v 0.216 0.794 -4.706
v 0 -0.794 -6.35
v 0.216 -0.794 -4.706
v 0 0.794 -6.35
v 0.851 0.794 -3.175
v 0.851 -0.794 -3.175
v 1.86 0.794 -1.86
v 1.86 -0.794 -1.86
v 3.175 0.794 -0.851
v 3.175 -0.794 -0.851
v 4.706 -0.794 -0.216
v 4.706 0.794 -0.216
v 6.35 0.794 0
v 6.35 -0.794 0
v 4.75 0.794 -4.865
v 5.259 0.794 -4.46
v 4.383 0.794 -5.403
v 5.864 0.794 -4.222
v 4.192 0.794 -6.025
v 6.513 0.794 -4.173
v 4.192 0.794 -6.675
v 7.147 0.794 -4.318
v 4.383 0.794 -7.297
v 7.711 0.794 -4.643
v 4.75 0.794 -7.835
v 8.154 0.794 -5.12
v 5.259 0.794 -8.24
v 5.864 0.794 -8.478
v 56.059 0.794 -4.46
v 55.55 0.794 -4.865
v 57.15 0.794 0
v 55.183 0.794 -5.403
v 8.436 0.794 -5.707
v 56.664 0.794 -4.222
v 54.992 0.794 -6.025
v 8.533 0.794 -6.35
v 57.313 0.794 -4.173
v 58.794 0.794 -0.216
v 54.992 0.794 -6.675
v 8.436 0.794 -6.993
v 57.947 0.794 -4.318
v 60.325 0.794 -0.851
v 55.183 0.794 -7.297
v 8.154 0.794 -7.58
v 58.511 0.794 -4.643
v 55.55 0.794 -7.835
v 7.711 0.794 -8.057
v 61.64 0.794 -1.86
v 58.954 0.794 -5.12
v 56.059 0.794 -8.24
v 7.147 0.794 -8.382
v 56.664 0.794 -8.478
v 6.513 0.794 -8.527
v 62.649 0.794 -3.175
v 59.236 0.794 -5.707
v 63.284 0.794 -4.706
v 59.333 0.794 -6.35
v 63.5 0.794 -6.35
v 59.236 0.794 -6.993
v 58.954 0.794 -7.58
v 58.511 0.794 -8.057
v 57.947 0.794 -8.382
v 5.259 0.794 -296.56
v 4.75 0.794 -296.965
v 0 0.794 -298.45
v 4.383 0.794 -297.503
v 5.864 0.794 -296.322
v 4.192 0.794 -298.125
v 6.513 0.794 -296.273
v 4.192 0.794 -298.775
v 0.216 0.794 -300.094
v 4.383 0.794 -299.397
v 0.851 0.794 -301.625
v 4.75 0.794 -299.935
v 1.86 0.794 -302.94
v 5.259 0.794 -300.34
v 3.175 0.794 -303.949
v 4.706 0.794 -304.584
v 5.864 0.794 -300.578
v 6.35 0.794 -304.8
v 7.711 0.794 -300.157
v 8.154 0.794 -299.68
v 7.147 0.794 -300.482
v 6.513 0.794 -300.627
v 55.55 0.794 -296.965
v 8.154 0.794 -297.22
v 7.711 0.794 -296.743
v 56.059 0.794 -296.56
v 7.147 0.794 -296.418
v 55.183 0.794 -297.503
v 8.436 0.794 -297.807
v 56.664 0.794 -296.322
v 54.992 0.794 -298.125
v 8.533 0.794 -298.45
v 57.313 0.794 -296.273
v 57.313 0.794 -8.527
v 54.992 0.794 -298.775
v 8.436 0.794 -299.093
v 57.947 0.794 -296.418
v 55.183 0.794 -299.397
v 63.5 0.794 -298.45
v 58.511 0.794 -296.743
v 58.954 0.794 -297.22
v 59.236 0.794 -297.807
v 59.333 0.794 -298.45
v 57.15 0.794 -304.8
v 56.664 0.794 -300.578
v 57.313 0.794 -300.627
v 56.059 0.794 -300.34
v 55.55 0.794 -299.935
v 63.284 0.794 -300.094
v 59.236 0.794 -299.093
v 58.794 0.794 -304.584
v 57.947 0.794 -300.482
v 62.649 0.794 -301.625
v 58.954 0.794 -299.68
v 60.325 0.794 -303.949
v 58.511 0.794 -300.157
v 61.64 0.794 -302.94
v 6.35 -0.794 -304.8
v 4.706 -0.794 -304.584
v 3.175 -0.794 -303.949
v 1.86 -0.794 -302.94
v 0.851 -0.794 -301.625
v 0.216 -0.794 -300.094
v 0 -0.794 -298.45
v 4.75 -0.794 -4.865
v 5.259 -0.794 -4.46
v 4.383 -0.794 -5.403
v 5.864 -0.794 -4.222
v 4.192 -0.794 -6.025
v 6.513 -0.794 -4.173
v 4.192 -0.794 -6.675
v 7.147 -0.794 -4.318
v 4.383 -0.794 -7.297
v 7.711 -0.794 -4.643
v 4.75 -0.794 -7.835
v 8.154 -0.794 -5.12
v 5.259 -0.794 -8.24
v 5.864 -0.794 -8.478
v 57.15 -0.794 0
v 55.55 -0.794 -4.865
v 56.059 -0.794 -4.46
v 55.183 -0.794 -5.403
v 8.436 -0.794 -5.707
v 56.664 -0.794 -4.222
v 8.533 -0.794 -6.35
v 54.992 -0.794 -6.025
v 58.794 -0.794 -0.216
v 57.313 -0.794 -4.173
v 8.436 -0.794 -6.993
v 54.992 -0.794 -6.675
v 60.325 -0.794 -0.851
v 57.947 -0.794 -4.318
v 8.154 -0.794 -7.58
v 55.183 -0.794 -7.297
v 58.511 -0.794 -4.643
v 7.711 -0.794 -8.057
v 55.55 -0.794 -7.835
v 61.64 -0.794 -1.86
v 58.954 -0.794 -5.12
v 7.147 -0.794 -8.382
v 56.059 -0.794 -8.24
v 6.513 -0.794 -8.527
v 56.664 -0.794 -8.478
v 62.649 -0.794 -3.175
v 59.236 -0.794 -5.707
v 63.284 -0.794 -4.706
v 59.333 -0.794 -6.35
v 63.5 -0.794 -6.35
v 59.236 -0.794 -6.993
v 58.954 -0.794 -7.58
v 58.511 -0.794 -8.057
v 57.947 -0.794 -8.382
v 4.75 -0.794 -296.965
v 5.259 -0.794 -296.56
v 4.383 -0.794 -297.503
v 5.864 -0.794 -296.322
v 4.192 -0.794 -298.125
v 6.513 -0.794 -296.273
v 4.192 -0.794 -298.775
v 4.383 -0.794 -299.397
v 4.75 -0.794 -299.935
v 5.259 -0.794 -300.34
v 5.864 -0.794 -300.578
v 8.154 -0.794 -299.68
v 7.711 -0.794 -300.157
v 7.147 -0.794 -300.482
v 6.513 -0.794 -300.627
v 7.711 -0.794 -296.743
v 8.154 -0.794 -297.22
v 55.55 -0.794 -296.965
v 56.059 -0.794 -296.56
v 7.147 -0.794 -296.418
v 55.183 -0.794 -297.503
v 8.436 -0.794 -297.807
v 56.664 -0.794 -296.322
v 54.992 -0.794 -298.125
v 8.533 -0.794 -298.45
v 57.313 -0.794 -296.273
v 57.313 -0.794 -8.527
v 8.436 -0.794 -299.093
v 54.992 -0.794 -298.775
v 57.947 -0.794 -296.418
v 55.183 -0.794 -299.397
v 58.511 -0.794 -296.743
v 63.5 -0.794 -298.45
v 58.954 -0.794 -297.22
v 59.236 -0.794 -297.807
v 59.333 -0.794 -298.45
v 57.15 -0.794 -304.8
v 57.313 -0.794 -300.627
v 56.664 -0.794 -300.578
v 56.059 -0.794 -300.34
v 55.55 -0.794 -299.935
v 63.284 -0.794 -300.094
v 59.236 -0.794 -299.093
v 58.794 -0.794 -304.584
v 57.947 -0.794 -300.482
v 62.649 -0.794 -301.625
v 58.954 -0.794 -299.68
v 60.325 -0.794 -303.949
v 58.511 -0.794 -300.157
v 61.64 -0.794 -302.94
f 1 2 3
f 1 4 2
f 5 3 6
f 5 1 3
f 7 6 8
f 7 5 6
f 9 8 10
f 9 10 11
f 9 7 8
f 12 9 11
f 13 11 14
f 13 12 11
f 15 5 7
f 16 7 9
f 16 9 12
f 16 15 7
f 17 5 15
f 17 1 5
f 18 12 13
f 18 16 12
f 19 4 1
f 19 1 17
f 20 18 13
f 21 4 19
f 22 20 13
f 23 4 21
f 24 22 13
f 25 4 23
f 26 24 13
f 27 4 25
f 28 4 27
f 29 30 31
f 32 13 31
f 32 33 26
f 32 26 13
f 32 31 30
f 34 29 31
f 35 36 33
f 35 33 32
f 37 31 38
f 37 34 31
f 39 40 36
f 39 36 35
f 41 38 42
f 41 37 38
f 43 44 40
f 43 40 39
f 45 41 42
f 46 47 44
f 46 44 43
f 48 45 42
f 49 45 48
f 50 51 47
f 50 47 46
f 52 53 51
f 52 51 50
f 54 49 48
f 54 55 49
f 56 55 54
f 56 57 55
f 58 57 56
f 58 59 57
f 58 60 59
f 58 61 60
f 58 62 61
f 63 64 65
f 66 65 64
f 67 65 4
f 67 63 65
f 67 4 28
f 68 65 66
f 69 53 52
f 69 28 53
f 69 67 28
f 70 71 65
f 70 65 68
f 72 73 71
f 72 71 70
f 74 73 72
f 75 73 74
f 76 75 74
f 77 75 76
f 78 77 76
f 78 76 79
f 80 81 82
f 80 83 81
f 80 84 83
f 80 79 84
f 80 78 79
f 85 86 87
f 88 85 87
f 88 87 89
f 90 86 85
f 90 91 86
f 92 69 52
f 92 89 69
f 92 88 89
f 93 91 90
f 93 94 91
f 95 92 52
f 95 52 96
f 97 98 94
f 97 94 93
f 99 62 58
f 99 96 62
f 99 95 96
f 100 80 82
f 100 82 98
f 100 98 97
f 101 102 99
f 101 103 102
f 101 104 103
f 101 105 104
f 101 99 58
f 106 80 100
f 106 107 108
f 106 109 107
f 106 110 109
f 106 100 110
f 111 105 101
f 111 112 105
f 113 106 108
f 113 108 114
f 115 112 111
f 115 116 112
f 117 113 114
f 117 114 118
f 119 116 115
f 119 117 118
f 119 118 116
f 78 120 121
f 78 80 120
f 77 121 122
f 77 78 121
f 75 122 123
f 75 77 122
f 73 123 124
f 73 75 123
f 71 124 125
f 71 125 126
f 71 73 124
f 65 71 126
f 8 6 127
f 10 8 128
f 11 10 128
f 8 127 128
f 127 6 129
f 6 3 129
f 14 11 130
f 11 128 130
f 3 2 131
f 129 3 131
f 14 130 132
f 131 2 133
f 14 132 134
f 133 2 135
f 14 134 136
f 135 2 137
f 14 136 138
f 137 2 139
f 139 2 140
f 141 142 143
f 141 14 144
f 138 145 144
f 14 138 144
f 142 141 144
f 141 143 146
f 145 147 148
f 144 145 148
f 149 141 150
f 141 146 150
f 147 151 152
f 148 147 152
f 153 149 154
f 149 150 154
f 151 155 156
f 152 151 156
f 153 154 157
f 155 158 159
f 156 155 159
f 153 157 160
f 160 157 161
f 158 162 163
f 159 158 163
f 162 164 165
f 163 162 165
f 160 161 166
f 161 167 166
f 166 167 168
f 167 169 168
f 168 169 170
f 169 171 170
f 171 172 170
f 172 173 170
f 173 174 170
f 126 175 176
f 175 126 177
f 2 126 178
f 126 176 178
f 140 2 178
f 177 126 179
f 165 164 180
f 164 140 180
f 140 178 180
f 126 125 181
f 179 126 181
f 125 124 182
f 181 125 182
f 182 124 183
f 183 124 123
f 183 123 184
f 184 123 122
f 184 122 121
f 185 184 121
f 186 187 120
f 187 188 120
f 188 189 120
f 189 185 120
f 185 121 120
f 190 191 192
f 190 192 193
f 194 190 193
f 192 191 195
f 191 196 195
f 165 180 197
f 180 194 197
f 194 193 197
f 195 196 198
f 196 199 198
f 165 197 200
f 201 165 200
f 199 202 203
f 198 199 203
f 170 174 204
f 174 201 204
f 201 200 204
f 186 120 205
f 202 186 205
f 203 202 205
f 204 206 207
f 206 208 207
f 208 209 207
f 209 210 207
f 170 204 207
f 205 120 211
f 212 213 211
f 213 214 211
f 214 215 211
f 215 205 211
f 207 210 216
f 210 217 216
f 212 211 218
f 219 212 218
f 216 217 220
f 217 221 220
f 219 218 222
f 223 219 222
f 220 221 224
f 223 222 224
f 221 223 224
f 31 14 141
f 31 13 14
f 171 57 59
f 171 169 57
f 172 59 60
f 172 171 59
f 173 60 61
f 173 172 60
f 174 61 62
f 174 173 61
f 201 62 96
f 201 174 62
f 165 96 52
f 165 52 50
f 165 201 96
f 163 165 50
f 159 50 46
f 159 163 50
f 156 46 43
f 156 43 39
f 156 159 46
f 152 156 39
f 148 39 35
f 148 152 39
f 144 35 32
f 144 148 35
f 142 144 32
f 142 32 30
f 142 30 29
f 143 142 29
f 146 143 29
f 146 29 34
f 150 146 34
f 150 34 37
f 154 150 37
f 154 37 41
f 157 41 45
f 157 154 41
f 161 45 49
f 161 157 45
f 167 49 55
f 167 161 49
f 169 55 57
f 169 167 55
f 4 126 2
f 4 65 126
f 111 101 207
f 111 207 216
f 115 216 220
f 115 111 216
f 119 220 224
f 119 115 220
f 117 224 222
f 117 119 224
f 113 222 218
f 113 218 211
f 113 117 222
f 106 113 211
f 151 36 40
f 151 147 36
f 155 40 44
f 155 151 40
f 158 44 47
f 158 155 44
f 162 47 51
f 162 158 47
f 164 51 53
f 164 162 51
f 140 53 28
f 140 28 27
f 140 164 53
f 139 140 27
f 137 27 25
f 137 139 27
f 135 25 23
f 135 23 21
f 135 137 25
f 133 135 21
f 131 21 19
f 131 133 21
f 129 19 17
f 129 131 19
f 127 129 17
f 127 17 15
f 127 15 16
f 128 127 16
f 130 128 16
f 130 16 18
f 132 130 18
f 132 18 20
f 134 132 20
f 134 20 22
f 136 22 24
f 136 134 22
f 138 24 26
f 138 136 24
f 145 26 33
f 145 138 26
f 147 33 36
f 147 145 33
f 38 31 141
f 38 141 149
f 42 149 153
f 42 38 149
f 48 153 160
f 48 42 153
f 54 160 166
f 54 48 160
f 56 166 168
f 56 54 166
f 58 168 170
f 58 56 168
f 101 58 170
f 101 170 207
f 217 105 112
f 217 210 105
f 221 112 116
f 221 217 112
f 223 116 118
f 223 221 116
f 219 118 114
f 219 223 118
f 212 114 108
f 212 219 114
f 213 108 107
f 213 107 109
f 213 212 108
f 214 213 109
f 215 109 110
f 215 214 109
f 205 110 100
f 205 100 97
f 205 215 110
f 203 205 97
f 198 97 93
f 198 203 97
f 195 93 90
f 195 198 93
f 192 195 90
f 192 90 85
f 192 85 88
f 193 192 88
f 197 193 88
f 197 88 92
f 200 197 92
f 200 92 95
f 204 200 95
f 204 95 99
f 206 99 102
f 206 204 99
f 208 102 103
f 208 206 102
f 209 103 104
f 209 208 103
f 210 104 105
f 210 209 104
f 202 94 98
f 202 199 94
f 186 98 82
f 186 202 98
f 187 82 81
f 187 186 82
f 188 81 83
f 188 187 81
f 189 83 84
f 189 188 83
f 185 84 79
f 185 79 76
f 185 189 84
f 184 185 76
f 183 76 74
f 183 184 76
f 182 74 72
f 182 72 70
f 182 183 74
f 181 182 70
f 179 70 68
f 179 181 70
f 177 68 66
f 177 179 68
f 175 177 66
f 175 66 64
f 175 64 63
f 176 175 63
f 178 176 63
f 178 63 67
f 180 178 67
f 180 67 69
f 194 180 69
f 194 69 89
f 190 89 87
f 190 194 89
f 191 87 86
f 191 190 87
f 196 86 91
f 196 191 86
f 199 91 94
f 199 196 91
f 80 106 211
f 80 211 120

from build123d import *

# Parameters (mm, degrees)
SKETCH1_R           = 2.1828125
BOSS_EXTRUDE1_DEPTH = 0.79375


with BuildPart() as part:
    # Sketch1 → Boss-Extrude1 (new body, symmetric)
    with BuildSketch(Plane(origin=(0, 0, 0), x_dir=(1, 0, 0), z_dir=(0, 1, 0))):
        with BuildLine():
            Line((6.35, 0), (57.15, 0))
            ThreePointArc((57.15, 0), (61.640128061, 1.859871939), (63.5, 6.35))
            Line((63.5, 6.35), (63.5, 298.45))
            ThreePointArc((63.5, 298.45), (61.640128061, 302.940128061), (57.15, 304.8))
            Line((57.15, 304.8), (6.35, 304.8))
            ThreePointArc((6.35, 304.8), (1.859871939, 302.940128061), (0, 298.45))
            Line((0, 298.45), (0, 6.35))
            ThreePointArc((0, 6.35), (1.859871939, 1.859871939), (6.35, 0))
        make_face()
        with Locations((57.15, 298.45)):
            Circle(SKETCH1_R, mode=Mode.SUBTRACT)
        with Locations((6.35, 298.45)):
            Circle(SKETCH1_R, mode=Mode.SUBTRACT)
        with Locations((6.35, 6.35)):
            Circle(SKETCH1_R, mode=Mode.SUBTRACT)
        with Locations((57.15, 6.35)):
            Circle(SKETCH1_R, mode=Mode.SUBTRACT)
    extrude(amount=BOSS_EXTRUDE1_DEPTH, both=True)


solid = part.part
